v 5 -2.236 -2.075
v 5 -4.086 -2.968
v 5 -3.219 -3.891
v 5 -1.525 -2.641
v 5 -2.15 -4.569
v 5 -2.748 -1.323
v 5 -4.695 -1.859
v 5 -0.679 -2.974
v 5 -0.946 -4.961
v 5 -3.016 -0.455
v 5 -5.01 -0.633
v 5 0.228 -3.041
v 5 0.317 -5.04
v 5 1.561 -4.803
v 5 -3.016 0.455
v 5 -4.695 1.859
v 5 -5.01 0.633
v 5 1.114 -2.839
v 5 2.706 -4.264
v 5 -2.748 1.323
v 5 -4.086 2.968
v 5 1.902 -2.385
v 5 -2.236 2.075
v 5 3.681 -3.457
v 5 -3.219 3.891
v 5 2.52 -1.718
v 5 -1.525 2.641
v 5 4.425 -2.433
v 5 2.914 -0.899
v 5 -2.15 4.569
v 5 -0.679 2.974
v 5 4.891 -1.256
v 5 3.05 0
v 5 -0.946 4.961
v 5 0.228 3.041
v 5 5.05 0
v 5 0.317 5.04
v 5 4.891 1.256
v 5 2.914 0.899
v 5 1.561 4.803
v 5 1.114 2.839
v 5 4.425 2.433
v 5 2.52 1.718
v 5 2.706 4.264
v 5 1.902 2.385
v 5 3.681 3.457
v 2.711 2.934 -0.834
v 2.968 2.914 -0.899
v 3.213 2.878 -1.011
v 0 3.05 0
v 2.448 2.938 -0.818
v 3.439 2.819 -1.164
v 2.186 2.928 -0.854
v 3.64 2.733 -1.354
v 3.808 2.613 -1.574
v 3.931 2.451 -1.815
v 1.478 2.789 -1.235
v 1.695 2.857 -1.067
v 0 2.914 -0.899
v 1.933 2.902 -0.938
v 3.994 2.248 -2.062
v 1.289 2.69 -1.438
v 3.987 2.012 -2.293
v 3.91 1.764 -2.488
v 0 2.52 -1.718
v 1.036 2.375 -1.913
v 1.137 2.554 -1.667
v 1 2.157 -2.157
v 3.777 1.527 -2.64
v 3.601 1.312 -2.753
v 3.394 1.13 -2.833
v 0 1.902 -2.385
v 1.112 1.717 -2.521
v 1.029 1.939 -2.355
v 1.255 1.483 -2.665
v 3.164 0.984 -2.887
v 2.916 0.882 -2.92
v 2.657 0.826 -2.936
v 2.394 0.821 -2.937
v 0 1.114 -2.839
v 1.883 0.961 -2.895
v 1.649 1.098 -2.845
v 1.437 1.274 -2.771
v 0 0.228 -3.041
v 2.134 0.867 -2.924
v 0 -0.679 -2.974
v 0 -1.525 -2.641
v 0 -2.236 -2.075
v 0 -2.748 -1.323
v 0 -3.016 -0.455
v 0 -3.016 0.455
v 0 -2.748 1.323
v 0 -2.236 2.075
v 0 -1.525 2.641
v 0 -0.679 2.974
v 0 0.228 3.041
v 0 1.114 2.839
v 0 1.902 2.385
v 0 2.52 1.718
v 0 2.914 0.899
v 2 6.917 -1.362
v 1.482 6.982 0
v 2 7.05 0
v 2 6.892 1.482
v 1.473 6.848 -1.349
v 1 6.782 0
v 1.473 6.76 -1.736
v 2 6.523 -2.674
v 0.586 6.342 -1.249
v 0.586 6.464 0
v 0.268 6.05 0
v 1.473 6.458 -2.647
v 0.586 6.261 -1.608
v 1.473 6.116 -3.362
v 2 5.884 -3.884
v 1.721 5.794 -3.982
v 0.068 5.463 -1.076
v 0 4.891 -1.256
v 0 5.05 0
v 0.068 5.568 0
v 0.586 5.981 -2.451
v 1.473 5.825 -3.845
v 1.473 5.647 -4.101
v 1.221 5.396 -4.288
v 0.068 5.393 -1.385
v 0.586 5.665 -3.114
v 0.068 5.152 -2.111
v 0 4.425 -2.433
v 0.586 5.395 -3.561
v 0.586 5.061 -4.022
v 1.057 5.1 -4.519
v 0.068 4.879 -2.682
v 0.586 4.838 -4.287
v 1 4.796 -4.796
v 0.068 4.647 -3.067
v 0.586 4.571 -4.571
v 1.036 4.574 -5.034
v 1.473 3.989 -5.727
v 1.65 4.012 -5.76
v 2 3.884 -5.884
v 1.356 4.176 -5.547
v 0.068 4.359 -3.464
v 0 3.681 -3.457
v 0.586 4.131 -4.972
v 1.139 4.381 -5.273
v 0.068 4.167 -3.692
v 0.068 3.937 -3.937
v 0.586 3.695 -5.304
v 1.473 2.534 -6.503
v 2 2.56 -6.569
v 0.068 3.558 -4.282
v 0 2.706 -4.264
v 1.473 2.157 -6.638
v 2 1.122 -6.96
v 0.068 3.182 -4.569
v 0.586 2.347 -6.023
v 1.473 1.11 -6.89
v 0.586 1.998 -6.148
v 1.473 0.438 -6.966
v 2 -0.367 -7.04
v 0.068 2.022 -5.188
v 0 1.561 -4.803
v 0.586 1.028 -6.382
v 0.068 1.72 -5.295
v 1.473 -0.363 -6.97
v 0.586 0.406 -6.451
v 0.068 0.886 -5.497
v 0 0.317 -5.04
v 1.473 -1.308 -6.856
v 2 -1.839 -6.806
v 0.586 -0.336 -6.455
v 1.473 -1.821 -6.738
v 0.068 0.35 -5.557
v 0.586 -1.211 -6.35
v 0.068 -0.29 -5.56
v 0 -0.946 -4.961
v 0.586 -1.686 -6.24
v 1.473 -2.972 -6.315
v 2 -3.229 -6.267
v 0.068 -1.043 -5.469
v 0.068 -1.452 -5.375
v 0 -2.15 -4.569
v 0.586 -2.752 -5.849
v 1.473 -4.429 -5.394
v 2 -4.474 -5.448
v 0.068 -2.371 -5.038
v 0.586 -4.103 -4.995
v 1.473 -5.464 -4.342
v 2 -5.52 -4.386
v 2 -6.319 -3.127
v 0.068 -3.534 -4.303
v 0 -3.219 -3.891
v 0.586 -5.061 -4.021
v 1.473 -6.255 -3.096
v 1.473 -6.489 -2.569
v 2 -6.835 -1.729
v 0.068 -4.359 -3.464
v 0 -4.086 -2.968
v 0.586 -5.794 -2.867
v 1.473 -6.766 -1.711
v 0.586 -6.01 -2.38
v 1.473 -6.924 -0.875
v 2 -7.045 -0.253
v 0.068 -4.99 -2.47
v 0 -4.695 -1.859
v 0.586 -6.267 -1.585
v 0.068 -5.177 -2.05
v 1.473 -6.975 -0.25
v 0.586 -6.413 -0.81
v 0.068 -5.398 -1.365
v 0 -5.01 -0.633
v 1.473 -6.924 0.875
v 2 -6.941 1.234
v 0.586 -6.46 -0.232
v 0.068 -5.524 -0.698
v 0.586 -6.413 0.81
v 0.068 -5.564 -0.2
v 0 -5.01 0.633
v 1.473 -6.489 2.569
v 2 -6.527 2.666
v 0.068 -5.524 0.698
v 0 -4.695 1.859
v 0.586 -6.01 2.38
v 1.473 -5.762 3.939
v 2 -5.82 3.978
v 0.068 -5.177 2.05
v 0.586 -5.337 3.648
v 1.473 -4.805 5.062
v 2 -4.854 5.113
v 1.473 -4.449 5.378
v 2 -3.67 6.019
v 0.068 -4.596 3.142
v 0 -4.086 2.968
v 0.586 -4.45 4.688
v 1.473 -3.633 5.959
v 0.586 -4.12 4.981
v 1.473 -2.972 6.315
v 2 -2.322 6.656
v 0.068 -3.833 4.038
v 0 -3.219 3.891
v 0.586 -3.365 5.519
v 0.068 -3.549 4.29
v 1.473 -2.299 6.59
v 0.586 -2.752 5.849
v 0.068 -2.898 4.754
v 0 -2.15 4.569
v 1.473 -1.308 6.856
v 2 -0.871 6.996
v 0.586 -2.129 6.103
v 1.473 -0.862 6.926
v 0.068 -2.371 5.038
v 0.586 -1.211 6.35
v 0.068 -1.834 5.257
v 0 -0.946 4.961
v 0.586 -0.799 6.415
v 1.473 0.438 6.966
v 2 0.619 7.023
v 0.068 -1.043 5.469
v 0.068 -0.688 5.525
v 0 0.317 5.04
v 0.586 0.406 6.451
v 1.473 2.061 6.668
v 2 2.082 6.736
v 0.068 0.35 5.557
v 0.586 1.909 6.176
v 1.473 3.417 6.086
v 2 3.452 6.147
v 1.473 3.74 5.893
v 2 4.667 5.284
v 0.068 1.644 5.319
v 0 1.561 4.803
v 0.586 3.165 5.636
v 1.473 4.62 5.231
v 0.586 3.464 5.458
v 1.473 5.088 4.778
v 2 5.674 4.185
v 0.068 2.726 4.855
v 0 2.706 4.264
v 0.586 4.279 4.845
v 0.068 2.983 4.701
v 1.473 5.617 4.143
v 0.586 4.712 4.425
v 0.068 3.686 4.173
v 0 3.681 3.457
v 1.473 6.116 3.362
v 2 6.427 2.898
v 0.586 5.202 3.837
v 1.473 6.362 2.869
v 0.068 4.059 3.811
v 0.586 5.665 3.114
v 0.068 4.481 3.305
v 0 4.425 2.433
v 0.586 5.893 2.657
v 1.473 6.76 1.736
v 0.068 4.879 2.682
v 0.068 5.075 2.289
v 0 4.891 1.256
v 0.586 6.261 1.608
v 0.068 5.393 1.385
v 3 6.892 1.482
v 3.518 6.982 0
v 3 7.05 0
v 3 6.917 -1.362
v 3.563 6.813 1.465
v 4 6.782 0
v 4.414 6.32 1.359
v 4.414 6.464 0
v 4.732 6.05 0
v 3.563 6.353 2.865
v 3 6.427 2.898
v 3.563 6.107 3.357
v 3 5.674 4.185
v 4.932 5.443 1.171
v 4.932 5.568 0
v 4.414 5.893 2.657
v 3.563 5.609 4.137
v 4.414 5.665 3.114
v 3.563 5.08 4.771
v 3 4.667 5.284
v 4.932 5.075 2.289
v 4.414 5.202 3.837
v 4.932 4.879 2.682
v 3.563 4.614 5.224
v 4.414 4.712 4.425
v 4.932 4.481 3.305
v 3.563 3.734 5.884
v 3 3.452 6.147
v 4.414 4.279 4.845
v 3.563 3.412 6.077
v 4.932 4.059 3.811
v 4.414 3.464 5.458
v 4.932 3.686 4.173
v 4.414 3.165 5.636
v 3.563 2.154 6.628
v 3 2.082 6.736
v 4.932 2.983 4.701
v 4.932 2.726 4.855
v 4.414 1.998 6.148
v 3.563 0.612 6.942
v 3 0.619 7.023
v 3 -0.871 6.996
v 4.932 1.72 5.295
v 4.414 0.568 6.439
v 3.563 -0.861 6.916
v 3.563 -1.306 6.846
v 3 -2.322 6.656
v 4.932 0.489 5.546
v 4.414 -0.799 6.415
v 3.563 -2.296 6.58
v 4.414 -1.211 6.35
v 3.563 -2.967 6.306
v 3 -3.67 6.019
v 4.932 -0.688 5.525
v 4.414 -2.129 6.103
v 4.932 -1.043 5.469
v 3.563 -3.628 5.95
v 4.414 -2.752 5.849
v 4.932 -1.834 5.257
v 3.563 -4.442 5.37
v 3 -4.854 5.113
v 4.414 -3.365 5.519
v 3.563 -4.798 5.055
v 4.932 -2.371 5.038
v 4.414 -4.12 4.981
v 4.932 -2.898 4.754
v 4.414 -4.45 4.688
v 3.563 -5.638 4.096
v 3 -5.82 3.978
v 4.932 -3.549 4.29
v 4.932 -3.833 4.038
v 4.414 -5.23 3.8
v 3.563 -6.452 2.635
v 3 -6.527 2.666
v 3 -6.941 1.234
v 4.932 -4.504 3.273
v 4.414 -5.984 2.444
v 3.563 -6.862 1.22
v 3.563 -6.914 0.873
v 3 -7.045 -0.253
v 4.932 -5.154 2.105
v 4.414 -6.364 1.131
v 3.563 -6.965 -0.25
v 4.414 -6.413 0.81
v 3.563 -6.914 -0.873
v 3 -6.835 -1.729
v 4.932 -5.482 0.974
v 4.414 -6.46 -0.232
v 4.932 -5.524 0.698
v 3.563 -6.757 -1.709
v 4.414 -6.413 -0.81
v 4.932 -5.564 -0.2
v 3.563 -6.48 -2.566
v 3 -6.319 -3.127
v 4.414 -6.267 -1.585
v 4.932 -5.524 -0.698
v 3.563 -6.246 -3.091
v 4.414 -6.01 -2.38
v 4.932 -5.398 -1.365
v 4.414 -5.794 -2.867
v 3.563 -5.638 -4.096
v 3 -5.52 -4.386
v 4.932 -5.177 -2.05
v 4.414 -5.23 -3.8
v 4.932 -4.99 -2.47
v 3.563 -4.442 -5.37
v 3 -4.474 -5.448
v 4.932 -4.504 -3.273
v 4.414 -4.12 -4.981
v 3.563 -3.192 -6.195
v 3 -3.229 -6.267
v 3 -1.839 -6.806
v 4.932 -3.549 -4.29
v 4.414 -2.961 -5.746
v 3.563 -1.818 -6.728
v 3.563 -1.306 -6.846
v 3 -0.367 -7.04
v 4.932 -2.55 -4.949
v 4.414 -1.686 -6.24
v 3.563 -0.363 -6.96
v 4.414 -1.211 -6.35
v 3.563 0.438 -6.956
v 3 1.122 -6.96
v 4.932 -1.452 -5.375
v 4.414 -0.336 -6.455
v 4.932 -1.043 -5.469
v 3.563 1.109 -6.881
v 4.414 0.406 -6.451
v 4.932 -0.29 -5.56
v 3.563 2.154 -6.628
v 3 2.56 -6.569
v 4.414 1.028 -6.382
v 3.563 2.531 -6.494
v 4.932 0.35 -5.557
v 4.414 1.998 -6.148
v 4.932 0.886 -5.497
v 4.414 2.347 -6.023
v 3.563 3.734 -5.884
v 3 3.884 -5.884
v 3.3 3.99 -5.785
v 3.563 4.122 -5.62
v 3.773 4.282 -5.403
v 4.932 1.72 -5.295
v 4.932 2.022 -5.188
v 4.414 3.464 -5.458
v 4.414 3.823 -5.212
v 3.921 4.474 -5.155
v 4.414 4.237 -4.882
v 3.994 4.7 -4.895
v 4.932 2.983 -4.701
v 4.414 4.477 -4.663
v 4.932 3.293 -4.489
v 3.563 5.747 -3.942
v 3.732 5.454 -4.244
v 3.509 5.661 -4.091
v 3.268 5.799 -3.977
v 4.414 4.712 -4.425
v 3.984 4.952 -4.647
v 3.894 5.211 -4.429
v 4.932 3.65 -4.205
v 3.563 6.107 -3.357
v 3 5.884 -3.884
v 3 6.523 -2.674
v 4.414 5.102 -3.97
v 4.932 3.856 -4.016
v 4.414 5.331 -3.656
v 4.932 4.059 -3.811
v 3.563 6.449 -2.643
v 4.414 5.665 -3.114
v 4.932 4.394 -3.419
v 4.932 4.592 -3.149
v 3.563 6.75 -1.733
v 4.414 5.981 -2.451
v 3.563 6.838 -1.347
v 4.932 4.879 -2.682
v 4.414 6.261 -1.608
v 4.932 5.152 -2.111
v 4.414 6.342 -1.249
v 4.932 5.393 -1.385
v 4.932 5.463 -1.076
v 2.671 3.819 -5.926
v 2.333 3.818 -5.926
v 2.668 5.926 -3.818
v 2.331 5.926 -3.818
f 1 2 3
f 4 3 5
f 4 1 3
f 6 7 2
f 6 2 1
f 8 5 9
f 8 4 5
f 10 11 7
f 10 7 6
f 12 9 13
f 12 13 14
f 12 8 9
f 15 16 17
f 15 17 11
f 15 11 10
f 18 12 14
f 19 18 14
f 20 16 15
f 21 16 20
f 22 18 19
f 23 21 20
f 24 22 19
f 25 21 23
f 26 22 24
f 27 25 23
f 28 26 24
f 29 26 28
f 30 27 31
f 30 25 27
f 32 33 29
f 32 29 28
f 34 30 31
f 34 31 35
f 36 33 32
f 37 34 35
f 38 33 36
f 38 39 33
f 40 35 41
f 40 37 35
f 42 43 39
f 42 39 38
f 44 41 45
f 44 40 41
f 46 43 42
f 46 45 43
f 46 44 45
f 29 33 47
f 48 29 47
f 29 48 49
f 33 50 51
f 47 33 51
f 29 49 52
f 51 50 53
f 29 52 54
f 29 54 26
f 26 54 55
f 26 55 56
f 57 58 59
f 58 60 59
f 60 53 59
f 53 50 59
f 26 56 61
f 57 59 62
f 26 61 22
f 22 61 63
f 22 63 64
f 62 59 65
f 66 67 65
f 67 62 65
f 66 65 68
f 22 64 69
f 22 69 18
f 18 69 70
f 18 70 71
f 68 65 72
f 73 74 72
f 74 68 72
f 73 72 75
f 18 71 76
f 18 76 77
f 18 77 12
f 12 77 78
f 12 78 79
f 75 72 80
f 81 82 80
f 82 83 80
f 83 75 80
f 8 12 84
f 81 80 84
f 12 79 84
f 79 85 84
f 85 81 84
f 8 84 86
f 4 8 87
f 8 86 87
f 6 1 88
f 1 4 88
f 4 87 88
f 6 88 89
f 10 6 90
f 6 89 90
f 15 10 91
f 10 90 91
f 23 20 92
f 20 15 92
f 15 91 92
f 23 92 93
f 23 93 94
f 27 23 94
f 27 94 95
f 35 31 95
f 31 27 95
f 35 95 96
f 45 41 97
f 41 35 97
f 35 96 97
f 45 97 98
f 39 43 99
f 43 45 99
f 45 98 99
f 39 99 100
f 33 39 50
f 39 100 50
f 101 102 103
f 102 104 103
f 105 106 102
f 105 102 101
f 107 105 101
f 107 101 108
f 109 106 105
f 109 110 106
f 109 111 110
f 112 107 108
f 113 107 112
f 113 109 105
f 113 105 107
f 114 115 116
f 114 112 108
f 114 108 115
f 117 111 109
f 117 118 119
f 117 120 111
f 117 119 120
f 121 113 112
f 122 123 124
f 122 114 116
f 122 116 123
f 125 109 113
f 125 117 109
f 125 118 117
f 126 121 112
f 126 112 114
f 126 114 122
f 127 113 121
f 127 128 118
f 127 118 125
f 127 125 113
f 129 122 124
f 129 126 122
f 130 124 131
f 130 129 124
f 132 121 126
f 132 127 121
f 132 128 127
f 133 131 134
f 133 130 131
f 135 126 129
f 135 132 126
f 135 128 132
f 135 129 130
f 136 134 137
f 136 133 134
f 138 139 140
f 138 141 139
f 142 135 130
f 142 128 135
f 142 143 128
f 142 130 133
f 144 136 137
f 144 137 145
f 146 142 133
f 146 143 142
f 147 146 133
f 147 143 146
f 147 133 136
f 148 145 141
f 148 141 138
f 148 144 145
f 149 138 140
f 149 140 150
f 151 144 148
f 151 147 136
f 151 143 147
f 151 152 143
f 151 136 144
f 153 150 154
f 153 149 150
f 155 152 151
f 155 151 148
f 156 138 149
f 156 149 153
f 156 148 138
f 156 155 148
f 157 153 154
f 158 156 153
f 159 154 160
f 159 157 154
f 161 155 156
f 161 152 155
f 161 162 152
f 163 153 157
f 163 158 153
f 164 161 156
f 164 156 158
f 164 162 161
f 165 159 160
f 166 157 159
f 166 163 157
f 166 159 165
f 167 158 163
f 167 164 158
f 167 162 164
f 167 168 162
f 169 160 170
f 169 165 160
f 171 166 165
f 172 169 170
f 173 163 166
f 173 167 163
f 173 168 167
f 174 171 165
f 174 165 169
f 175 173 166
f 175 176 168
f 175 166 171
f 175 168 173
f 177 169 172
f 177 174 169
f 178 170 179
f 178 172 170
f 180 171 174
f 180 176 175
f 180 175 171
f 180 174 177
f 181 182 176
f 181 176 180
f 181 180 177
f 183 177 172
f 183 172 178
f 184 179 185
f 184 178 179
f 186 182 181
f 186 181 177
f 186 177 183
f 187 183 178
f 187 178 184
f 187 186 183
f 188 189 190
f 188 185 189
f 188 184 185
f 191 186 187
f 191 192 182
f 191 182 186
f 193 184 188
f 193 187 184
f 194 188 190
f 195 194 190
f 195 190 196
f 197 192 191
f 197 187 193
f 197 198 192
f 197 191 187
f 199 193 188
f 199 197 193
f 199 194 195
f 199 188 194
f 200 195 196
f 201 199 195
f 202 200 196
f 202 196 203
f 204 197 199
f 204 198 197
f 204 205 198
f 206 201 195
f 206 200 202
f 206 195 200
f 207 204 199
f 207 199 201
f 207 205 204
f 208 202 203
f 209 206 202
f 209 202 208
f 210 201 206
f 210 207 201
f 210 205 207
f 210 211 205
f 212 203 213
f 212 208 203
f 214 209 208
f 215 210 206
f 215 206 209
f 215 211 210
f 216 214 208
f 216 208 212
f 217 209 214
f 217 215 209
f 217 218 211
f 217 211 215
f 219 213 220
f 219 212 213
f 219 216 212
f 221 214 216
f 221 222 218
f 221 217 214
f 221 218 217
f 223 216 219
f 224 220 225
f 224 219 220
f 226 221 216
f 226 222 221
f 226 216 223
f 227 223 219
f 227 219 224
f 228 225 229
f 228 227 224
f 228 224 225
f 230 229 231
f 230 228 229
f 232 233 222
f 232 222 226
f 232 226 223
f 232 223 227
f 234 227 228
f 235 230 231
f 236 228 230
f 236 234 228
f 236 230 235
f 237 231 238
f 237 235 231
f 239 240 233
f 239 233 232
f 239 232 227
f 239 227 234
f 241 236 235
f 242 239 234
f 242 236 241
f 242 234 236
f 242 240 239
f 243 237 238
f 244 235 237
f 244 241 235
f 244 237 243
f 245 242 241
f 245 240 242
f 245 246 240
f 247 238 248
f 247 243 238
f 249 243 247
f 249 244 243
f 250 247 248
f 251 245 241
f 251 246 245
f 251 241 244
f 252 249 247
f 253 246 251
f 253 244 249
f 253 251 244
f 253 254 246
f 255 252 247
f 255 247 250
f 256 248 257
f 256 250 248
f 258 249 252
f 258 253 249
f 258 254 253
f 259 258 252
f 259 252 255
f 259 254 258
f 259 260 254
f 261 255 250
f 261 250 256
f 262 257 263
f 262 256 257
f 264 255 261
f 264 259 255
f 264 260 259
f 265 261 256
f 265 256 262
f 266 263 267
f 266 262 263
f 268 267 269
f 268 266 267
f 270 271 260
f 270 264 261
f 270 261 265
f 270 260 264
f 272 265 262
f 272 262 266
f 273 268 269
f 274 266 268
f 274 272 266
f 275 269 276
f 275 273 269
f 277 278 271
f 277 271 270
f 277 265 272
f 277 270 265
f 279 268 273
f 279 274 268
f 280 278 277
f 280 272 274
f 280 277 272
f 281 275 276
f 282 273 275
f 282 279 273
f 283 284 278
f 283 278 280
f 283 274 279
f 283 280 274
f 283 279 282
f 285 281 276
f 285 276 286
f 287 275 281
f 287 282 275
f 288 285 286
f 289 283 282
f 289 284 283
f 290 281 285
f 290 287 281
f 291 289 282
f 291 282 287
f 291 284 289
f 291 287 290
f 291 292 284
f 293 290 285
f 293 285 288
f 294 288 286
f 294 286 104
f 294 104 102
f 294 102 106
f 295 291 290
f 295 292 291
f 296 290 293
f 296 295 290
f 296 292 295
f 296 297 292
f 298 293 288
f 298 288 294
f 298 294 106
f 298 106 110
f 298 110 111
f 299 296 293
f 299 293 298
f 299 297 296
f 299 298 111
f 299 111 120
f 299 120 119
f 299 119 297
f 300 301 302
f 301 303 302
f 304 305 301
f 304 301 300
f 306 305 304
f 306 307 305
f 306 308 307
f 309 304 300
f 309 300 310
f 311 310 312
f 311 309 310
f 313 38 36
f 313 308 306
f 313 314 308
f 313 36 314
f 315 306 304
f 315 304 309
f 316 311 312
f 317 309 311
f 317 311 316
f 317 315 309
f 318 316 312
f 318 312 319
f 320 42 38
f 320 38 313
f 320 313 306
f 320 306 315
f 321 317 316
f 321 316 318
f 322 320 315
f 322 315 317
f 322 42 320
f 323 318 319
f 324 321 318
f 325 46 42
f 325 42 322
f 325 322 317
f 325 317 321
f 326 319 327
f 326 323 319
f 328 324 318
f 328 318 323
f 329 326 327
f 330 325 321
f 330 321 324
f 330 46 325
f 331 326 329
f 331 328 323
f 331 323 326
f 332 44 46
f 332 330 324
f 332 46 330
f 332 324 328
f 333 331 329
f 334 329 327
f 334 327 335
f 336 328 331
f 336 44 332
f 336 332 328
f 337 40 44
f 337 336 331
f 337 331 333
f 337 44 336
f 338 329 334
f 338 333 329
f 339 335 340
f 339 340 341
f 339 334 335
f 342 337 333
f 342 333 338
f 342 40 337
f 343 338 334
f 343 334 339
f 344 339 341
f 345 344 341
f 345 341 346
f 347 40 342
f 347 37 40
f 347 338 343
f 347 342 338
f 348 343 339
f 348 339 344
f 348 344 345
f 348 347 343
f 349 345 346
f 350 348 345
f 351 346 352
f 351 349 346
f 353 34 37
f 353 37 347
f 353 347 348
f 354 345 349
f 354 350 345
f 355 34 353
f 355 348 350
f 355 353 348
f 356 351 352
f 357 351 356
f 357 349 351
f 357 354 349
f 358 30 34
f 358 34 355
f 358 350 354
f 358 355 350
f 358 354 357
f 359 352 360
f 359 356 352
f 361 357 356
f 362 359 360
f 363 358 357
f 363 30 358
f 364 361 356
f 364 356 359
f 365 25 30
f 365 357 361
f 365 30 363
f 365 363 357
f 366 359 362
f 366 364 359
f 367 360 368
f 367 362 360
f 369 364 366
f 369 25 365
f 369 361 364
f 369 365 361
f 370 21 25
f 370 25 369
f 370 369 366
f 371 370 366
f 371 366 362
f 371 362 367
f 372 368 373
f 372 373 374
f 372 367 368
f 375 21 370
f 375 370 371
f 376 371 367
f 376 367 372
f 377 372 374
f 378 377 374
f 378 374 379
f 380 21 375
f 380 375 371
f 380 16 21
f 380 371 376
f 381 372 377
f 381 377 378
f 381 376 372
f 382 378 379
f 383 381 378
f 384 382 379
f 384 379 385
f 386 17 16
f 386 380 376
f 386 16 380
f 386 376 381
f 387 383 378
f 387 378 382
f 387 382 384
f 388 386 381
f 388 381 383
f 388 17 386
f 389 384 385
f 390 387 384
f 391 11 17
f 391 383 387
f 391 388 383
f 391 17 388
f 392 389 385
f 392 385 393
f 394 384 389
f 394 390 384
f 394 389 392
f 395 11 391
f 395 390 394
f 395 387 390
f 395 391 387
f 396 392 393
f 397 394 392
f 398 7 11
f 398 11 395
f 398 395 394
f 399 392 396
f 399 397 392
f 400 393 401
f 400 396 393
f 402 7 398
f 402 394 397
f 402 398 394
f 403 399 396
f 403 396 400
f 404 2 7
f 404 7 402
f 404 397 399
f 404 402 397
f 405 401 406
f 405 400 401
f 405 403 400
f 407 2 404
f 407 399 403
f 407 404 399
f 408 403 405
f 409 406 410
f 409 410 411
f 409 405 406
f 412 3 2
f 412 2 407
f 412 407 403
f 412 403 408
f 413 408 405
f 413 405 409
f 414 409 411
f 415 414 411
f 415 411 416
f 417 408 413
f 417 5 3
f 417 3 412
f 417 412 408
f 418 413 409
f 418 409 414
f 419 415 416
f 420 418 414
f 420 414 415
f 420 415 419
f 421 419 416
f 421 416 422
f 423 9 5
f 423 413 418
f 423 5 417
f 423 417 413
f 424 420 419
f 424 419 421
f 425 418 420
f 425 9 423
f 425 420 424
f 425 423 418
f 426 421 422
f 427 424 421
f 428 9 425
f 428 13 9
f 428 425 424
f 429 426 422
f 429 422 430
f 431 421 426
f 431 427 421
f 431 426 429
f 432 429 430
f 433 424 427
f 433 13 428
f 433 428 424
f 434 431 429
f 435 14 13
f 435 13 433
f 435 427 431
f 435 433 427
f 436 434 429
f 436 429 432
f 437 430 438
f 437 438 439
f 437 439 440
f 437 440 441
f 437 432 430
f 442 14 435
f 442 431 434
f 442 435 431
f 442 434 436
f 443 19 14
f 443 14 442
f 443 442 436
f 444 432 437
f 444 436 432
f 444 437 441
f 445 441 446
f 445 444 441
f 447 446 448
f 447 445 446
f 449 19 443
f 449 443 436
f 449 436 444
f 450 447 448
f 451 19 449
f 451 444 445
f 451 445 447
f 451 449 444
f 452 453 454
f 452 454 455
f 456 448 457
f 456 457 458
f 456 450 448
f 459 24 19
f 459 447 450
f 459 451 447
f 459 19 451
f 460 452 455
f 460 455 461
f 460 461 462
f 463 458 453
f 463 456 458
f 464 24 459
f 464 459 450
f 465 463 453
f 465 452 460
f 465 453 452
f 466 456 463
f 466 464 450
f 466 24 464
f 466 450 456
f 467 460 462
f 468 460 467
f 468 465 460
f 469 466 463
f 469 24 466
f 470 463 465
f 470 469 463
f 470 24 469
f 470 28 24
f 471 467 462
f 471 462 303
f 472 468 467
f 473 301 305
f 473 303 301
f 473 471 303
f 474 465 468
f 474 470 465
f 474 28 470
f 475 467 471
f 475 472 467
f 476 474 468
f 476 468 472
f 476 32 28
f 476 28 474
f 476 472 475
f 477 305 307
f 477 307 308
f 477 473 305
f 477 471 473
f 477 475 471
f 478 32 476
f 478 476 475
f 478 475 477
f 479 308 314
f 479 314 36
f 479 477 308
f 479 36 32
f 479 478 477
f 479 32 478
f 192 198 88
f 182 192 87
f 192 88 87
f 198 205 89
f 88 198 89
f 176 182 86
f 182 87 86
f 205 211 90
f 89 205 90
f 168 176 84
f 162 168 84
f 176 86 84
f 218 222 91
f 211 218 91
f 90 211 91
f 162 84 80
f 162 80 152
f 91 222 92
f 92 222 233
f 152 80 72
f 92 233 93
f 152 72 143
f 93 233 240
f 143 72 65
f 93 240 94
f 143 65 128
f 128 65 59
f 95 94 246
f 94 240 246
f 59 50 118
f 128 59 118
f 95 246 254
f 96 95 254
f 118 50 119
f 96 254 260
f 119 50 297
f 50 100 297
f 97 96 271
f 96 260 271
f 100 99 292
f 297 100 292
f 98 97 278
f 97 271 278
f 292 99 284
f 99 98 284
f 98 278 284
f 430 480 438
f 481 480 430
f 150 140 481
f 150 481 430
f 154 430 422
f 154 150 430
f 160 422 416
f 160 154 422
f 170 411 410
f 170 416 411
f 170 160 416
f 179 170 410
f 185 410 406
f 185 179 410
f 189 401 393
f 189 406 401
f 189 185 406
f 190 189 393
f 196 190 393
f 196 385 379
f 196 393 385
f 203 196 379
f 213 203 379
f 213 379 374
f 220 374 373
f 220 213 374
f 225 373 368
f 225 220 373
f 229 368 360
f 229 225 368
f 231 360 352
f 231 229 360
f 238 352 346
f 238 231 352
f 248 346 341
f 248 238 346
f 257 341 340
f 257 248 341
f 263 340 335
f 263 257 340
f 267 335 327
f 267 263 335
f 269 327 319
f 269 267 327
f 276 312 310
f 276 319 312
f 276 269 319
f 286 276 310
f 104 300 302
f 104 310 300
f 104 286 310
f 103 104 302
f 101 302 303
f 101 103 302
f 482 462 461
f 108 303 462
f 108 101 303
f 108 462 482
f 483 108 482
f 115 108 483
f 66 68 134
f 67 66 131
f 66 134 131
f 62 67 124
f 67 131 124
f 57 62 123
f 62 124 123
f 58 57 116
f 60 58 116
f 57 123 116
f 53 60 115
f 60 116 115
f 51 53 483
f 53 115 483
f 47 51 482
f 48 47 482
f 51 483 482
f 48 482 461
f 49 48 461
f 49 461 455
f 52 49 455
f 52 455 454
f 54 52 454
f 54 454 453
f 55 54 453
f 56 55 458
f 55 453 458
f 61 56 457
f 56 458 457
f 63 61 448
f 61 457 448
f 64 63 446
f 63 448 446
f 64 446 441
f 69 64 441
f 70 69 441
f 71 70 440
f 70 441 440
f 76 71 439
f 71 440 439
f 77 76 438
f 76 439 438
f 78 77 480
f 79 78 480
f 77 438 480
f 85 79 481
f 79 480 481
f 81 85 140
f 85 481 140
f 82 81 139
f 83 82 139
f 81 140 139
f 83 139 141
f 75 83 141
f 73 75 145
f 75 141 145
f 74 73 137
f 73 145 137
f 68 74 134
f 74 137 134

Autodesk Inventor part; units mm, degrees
ref_plane "YZ Plane" through (0, 0, 0) normal (1, 0, 0) x (0, 1, 0)
ref_plane "XZ Plane" through (0, 0, 0) normal (0, 1, 0) x (-1, 0, 0)
sketch "Sketch1" plane through (0, 0, 0) normal (1, 0, 0) x (0, 1, 0)
  circle A0 centre (0, 0) radius 3.05
  circle A1 centre (0, 0) radius 7.05
  dimension "d0" = 6.1
  dimension "d1" = 4
extrude "Extrusion1" add sketch "Sketch1" along normal blind 5
sketch "Sketch2" plane through (5, 0, 0) normal (1, 0, 0) x (0, 0, -1)
  line L0 (0, 0) -> (4.9851, 4.9851)
  circle A0 centre (0, 0) radius 7.05 projected
  line L1 (0, 0) -> (7.05, 0) construction
  dimension "d4" = 45
ref_plane "Work Plane1" through (5, 4.9851, -4.9851) normal (0, 0.7071068, -0.7071068) x (-1, 0, 0)
sketch "Sketch3" plane through (5, 4.9851, -4.9851) normal (0, 0.7071068, -0.7071068) x (-1, 0, 0)
  line L0 (5, 0) -> (0, 0)
  line L1 (0, 7.05) -> (0, -7.05) projected
  line L2 (5, 0) -> (10, 0) construction
  circle A0 centre (2.5, 0) radius 1.5
  dimension "d5" = 5
  dimension "d6" = 180
  dimension "d7" = 3
extrude "Extrusion2" cut sketch "Sketch3" against normal blind 5
thread "Thread1" size "M3x0.5" class "6H" standard "ANSI Metric M Profile" full length
fillet "Fillet1" radius 2 2 edges at (5, -7.05, 0) (0, -7.05, 0)
properties part number "6mm rod topper"
